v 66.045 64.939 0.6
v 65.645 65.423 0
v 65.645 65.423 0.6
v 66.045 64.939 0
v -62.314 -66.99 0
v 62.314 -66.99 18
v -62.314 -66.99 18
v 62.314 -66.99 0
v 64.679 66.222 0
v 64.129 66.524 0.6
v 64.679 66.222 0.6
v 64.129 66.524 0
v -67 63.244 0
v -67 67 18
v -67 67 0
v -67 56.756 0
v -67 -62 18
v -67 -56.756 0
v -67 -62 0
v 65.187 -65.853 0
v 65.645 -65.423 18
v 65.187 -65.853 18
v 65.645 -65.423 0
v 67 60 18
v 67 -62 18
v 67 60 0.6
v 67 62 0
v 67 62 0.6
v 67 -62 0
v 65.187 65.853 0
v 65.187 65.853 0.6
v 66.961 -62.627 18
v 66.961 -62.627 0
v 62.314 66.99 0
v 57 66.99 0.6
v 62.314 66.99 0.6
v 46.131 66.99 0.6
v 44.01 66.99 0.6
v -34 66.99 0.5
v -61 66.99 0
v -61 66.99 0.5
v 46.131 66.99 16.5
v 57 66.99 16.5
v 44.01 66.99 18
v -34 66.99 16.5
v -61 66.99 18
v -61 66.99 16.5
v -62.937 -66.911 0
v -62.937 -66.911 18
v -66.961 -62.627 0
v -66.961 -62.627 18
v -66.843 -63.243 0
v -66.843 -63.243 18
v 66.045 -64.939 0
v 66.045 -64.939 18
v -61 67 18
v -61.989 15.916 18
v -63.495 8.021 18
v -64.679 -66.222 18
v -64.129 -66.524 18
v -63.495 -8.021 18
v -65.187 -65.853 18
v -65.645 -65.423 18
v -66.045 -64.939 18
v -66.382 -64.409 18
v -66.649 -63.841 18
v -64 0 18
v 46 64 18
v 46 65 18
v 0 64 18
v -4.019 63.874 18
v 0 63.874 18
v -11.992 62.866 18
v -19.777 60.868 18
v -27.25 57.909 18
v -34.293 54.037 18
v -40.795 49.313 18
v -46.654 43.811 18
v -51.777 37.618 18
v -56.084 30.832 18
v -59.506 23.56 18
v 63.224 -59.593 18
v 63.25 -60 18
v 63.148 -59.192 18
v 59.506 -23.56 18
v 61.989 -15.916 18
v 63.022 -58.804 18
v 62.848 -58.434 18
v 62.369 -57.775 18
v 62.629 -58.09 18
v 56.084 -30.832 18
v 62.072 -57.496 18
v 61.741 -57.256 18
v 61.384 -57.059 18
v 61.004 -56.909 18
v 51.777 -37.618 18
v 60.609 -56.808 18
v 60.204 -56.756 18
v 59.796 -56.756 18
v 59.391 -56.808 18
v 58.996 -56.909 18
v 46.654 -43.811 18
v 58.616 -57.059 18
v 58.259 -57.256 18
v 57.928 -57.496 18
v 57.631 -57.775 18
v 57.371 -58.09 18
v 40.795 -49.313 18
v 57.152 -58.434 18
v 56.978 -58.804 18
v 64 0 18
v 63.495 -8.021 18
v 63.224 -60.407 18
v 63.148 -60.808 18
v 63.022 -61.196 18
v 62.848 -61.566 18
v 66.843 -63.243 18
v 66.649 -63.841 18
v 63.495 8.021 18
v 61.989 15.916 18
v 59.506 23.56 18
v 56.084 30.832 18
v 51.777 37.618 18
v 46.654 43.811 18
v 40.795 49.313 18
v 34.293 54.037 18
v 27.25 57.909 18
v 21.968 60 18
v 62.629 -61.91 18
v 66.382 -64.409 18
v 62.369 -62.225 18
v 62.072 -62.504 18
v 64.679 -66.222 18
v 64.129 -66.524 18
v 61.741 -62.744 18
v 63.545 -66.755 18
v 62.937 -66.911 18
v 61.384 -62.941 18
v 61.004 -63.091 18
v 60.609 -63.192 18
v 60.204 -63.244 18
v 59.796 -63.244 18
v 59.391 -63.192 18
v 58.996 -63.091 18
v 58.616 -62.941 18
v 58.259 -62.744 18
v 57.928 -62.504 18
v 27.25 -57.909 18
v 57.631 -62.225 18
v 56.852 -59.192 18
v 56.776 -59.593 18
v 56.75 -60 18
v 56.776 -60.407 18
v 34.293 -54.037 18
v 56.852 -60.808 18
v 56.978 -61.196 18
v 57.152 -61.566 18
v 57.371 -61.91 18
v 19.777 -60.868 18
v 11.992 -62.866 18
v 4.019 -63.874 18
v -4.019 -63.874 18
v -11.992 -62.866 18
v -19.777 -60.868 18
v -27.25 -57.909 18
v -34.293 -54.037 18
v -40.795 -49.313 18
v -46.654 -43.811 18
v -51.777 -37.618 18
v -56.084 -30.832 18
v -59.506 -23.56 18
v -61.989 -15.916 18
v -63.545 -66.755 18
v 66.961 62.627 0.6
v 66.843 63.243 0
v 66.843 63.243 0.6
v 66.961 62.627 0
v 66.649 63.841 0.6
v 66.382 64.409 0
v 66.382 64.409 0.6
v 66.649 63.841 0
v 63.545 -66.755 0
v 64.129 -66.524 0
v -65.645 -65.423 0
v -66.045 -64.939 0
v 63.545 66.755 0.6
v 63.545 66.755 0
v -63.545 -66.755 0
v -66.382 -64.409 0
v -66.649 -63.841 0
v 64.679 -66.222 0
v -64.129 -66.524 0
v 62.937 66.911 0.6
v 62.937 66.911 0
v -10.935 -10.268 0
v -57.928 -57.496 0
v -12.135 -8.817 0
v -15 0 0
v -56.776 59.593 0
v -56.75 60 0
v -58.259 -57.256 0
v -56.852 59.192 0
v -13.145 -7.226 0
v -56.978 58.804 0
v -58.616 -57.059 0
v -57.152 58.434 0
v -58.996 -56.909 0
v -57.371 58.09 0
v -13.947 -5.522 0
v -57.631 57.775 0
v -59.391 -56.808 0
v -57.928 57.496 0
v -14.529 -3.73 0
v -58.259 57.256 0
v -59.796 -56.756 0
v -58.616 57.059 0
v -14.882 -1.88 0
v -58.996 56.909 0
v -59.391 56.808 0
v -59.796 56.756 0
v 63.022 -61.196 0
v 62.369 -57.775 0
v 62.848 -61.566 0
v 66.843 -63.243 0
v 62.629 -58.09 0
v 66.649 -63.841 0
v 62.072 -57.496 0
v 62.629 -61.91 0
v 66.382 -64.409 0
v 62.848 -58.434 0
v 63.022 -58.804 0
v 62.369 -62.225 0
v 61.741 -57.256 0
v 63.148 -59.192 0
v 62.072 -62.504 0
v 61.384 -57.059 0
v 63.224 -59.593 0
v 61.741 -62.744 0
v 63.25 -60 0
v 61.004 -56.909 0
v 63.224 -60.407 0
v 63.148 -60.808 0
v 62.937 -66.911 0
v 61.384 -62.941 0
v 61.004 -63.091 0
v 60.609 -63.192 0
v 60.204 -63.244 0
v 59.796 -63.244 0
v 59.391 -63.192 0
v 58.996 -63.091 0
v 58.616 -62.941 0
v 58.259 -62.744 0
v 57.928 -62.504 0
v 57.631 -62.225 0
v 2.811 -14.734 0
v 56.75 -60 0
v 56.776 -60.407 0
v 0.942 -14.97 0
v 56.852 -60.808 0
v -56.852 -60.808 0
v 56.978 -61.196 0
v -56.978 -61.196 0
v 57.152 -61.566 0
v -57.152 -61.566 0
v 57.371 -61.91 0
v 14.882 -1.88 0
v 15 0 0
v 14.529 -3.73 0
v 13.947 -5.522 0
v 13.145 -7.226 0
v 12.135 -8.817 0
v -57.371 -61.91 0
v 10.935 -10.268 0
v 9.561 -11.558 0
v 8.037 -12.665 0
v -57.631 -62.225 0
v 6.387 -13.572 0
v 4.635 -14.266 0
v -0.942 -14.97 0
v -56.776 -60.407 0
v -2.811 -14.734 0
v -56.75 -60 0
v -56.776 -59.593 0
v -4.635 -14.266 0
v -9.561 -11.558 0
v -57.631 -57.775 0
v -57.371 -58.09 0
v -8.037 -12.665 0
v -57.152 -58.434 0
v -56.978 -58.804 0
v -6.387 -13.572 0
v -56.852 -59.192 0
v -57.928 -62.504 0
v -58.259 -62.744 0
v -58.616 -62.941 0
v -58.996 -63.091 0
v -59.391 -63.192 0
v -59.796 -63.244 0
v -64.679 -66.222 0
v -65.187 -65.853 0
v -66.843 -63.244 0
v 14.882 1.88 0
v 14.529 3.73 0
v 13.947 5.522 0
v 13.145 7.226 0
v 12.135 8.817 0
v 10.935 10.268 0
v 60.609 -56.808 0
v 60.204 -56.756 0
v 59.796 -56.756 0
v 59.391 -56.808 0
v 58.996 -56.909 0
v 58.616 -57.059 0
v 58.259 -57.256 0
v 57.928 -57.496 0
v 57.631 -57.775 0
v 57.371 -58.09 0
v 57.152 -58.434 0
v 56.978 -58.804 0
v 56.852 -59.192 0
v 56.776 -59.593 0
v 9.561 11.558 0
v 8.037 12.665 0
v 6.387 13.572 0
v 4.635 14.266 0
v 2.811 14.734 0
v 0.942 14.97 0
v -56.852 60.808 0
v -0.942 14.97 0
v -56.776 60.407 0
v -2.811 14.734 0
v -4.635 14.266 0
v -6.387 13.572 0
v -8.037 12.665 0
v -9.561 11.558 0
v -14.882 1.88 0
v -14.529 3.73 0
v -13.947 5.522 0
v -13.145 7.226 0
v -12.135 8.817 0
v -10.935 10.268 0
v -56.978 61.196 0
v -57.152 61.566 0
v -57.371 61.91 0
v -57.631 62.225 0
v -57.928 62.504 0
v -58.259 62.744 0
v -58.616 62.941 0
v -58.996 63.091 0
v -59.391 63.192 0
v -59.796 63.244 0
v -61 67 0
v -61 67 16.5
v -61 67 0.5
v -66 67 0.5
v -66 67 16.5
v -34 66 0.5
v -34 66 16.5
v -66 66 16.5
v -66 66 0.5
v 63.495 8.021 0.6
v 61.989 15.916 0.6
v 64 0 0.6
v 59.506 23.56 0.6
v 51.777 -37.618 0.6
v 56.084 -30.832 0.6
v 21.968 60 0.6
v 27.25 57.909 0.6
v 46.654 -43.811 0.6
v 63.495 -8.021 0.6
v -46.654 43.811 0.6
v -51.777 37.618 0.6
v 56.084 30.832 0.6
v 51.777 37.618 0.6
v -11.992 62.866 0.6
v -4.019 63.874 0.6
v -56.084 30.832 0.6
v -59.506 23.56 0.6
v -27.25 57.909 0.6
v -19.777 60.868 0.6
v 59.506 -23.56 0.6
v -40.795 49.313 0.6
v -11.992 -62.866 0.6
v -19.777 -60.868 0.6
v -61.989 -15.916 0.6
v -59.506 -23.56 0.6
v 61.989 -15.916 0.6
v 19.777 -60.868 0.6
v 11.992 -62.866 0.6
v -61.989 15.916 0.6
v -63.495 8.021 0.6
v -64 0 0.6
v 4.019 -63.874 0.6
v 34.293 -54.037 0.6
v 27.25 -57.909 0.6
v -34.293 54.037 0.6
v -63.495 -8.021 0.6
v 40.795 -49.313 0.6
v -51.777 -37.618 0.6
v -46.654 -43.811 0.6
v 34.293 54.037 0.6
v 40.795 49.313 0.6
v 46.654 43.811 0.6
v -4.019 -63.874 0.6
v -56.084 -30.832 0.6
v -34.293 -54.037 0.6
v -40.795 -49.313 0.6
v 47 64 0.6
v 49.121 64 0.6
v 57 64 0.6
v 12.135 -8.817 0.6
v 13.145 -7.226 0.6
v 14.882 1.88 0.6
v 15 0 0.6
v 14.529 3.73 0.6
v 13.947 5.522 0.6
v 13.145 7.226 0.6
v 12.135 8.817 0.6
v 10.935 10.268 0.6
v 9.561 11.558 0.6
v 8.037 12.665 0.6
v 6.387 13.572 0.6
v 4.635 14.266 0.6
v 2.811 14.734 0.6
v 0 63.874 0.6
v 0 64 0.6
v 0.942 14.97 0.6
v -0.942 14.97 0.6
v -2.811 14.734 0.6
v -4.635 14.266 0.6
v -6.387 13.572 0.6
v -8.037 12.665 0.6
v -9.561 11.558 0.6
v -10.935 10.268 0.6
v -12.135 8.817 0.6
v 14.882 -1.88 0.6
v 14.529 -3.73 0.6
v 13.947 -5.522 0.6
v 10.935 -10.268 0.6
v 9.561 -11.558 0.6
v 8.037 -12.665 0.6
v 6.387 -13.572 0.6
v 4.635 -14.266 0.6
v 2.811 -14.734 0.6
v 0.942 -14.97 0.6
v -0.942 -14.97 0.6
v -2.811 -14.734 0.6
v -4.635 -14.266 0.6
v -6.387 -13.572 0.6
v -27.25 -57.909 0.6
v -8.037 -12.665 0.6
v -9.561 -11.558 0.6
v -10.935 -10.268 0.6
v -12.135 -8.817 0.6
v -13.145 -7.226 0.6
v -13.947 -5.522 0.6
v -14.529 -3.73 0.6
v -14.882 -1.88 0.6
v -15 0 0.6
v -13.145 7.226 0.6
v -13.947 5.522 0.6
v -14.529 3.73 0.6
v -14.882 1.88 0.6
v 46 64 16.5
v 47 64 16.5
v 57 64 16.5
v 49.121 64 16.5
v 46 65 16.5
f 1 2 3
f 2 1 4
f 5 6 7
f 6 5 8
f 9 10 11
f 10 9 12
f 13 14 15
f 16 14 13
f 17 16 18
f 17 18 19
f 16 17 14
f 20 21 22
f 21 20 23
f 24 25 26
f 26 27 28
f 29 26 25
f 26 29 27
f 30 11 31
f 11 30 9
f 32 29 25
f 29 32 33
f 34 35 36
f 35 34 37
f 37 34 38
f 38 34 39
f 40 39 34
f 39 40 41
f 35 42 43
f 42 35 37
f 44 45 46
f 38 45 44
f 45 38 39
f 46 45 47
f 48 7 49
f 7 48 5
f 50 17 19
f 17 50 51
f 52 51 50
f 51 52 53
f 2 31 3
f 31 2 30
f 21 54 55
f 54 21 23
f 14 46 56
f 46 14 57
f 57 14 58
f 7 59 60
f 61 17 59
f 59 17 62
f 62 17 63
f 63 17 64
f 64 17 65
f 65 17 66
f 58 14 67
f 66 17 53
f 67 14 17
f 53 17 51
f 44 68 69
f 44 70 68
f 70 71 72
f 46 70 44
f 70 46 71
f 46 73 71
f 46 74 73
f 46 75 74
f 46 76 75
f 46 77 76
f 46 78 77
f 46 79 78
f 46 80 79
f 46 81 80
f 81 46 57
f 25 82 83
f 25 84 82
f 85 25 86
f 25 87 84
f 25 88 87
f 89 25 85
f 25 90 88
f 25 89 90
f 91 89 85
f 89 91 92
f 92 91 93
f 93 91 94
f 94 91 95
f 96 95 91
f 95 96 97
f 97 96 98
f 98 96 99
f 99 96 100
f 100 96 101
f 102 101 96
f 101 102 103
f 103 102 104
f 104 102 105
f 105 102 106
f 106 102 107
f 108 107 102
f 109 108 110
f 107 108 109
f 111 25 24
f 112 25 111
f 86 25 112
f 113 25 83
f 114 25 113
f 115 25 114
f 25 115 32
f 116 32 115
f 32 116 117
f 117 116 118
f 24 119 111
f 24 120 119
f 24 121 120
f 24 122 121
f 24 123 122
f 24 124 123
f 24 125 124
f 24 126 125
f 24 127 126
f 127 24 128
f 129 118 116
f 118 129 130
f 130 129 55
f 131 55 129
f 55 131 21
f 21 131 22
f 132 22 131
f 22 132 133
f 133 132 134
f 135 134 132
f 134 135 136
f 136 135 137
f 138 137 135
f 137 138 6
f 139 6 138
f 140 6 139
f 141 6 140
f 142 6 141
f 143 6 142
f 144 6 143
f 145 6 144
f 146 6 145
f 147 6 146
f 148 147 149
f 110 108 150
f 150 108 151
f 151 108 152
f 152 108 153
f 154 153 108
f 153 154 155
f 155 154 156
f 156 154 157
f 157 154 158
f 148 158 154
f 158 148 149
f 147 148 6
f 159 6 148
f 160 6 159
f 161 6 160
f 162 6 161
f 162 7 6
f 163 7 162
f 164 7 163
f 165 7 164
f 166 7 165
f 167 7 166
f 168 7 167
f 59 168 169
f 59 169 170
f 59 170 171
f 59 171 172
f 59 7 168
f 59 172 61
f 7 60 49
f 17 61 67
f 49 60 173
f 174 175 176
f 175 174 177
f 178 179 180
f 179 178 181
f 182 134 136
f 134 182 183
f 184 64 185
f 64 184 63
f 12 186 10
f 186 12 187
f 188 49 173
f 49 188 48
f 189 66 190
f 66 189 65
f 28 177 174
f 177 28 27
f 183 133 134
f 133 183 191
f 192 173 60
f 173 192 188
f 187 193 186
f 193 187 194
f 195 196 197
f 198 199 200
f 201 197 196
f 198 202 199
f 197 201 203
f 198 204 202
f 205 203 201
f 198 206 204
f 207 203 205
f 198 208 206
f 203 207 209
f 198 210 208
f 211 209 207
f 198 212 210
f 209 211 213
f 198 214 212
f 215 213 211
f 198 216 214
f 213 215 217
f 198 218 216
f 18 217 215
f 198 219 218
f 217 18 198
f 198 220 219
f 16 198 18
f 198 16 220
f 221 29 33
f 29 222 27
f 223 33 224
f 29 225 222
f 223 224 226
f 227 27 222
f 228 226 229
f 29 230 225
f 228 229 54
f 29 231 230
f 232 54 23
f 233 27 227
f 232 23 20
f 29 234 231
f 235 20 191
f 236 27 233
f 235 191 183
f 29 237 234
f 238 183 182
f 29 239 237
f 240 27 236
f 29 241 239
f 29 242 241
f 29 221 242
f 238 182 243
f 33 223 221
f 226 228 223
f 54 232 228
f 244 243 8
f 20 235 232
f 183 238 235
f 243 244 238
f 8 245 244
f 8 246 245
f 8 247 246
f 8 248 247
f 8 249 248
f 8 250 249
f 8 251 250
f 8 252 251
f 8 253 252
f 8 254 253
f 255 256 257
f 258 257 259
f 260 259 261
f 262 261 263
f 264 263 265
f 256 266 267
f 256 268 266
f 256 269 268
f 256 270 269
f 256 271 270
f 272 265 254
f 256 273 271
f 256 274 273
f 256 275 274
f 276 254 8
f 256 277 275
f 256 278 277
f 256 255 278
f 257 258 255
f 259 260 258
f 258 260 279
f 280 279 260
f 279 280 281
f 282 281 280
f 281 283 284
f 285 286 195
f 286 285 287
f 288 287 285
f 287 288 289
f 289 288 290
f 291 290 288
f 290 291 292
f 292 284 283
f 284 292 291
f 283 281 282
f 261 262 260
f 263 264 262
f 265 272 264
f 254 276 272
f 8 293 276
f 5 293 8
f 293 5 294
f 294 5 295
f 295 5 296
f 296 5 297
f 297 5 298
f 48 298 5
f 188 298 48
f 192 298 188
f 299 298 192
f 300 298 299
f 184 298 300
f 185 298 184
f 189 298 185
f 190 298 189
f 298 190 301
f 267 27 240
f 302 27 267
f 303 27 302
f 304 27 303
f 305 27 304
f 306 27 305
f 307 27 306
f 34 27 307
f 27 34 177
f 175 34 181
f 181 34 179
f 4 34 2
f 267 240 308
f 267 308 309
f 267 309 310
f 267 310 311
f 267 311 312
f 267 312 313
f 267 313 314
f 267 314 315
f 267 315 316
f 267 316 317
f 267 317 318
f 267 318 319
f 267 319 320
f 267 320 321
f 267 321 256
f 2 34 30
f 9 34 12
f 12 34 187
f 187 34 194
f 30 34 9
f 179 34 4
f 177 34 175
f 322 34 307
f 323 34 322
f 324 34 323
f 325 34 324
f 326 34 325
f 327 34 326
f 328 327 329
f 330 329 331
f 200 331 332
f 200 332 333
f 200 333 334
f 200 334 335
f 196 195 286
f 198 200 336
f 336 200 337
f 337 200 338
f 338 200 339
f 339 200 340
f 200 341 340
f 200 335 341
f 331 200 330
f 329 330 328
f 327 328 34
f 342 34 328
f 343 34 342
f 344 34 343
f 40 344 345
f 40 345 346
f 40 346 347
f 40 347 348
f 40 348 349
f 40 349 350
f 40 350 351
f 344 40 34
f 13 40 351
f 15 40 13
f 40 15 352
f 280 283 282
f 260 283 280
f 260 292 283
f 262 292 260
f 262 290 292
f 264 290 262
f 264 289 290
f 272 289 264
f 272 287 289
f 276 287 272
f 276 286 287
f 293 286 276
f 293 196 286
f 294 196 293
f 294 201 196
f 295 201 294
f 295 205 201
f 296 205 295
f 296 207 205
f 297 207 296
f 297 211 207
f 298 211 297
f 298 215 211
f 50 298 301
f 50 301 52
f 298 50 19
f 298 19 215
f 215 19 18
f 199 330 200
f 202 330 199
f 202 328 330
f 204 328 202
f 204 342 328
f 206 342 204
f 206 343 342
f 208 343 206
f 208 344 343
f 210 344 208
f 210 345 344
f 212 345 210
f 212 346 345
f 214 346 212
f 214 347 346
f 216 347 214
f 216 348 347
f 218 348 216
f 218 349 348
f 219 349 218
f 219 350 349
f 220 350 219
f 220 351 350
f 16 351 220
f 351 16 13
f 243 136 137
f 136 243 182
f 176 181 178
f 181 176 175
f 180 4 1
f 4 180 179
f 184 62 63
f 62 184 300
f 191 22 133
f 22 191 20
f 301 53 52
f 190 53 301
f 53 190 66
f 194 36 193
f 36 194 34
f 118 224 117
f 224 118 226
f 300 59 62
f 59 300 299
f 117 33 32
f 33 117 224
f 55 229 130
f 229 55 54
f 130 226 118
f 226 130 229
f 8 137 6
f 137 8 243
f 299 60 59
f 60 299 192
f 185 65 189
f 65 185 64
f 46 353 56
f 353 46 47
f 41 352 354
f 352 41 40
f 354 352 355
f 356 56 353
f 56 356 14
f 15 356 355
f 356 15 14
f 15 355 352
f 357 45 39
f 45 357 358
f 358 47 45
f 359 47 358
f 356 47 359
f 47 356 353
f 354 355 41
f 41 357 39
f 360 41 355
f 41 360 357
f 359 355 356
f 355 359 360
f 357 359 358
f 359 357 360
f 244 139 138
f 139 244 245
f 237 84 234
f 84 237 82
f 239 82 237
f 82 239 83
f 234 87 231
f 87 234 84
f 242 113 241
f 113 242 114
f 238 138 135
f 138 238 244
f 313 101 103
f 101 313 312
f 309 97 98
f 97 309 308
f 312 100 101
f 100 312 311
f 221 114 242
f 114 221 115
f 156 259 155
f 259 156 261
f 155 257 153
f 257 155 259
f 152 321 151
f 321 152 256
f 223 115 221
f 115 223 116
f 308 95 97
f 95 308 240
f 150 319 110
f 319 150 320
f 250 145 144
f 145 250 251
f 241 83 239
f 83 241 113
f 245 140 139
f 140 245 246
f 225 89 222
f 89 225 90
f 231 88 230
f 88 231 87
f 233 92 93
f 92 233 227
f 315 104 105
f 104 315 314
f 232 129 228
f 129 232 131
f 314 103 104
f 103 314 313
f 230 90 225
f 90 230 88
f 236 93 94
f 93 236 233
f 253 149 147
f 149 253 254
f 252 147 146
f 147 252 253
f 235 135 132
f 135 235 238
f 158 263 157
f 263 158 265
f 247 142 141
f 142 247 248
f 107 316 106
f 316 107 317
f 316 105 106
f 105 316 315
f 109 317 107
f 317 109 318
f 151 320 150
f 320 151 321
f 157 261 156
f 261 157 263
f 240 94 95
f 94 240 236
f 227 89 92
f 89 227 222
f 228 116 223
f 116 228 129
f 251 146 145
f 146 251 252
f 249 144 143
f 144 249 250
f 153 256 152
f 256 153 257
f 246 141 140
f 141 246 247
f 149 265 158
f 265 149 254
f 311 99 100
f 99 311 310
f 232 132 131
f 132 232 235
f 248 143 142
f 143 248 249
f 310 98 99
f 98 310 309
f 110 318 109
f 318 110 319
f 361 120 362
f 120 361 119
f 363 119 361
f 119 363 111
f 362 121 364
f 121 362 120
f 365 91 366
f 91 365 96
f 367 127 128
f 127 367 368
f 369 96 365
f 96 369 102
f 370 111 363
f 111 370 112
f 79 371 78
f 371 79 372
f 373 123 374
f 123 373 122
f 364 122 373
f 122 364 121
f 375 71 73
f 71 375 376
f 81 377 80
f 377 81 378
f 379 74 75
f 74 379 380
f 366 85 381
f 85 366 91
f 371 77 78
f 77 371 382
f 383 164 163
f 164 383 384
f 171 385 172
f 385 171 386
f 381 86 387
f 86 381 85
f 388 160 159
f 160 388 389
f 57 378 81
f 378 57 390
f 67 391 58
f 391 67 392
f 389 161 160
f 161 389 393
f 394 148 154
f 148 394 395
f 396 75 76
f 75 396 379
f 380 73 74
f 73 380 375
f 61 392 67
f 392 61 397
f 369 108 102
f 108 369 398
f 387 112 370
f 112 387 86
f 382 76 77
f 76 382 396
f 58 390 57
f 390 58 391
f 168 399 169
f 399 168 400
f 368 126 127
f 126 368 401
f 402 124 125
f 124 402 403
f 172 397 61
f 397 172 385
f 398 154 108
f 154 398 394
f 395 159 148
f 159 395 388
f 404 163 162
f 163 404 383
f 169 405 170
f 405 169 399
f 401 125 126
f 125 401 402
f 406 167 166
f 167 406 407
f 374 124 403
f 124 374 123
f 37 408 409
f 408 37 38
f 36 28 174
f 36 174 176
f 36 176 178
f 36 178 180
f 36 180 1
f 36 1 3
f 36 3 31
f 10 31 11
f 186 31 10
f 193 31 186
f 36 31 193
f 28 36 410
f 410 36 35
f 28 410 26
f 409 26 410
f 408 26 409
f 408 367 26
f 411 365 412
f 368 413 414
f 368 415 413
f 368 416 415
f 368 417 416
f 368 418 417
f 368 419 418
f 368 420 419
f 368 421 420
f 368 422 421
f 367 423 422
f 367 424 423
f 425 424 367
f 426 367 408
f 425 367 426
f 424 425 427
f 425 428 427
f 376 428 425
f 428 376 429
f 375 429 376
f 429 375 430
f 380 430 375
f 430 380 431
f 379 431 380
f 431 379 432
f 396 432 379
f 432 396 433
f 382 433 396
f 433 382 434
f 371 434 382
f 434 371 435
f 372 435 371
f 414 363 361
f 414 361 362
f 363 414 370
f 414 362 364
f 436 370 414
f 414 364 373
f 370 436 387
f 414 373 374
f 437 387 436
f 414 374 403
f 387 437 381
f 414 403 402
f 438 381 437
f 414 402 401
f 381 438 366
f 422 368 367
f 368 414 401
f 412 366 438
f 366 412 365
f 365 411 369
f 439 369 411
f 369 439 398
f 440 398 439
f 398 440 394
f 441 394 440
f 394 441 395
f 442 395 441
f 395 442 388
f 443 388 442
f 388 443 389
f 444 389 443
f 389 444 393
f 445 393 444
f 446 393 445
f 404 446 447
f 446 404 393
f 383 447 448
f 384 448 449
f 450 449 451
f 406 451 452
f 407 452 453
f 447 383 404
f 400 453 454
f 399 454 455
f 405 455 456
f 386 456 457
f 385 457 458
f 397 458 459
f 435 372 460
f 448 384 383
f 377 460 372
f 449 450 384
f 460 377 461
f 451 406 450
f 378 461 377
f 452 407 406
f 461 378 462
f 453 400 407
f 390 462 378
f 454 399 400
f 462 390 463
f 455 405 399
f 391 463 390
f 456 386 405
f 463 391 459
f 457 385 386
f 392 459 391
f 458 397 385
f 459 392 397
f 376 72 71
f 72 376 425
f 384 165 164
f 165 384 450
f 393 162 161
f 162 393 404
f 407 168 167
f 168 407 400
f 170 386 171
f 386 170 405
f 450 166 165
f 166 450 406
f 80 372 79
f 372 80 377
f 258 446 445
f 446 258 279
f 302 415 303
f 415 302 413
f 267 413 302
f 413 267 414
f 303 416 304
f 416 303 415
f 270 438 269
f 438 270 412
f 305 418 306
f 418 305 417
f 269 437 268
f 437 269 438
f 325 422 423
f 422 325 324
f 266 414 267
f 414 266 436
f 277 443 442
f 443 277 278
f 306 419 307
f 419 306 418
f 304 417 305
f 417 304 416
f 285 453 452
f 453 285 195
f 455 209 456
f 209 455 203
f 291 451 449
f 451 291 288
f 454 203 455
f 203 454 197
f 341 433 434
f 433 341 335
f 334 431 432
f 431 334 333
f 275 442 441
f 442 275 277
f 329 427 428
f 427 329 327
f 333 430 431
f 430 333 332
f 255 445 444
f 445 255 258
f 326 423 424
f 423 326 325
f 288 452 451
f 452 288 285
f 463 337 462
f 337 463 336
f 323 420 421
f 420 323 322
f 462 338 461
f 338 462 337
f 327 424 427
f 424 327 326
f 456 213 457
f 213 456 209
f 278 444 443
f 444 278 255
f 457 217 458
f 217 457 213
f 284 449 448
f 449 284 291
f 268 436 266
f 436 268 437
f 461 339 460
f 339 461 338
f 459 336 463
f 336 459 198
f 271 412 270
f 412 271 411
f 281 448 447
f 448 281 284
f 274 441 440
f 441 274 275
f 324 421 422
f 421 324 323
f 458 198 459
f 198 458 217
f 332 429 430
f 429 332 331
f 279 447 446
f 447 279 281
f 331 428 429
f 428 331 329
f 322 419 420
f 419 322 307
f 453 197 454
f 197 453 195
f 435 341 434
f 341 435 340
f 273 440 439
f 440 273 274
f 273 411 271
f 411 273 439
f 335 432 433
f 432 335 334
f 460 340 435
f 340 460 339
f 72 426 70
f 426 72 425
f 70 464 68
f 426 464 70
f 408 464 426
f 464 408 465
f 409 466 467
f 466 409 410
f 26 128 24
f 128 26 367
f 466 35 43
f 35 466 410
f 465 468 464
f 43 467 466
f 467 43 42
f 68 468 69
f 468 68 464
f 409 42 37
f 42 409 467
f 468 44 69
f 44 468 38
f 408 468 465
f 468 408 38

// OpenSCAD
$fn = 50;


difference() {
	union() {
		hull() {
			translate(v = [-62.0000000000, 62.0000000000, 0]) {
				cylinder(h = 18, r = 5);
			}
			translate(v = [62.0000000000, 62.0000000000, 0]) {
				cylinder(h = 18, r = 5);
			}
			translate(v = [-62.0000000000, -62.0000000000, 0]) {
				cylinder(h = 18, r = 5);
			}
			translate(v = [62.0000000000, -62.0000000000, 0]) {
				cylinder(h = 18, r = 5);
			}
		}
		translate(v = [-67.0000000000, 61.0000000000, 0]) {
			cube(size = [6, 6, 18]);
		}
	}
	union() {
		translate(v = [-67.5000000000, -60.0000000000, -250.0000000000]) {
			rotate(a = [0, 0, 0]) {
				difference() {
					union() {
						hull() {
							translate(v = [7.5000000000, 0, 0]) {
								cylinder(h = 250, r = 3.2500000000, r1 = 3.2500000000, r2 = 3.2500000000);
							}
							translate(v = [-7.5000000000, 0, 0]) {
								cylinder(h = 250, r = 3.2500000000, r1 = 3.2500000000, r2 = 3.2500000000);
							}
						}
					}
					union();
				}
			}
		}
		translate(v = [-67.5000000000, 60.0000000000, -250.0000000000]) {
			rotate(a = [0, 0, 0]) {
				difference() {
					union() {
						hull() {
							translate(v = [7.5000000000, 0, 0]) {
								cylinder(h = 250, r = 3.2500000000, r1 = 3.2500000000, r2 = 3.2500000000);
							}
							translate(v = [-7.5000000000, 0, 0]) {
								cylinder(h = 250, r = 3.2500000000, r1 = 3.2500000000, r2 = 3.2500000000);
							}
						}
					}
					union();
				}
			}
		}
		translate(v = [-66.0000000000, 66.0000000000, 0.5000000000]) {
			cube(size = [32, 1, 16]);
		}
		translate(v = [60.0000000000, -60.0000000000, -50.0000000000]) {
			cylinder(h = 100, r = 3.2500000000);
		}
		translate(v = [0, 0, 0.6000000000]) {
			cylinder(h = 20.4000000000, r = 64.0000000000);
		}
		translate(v = [0, 0, -9.0000000000]) {
			cylinder(h = 18, r = 15.0000000000);
		}
		translate(v = [0.0000000000, 60.0000000000, 0.6000000000]) {
			cube(size = [67.0000000000, 4, 20.4000000000]);
		}
		translate(v = [57.0000000000, 60.0000000000, 0.6000000000]) {
			cube(size = [10, 7, 20.4000000000]);
		}
		translate(v = [46.0000000000, 60.0000000000, 16.5000000000]) {
			cube(size = [21, 7, 1.5000000000]);
		}
		translate(v = [43.2500000000, 67.7500000000, 0.6000000000]) {
			rotate(a = [0, 0, -45]) {
				cube(size = [7.5000000000, 1.5000000000, 20.4000000000]);
			}
		}
		translate(v = [12.0610000000, 58.0000000000, 0.6000000000]) {
			cube(size = [7.5000000000, 2, 17.4000000000]);
		}
	}
}
